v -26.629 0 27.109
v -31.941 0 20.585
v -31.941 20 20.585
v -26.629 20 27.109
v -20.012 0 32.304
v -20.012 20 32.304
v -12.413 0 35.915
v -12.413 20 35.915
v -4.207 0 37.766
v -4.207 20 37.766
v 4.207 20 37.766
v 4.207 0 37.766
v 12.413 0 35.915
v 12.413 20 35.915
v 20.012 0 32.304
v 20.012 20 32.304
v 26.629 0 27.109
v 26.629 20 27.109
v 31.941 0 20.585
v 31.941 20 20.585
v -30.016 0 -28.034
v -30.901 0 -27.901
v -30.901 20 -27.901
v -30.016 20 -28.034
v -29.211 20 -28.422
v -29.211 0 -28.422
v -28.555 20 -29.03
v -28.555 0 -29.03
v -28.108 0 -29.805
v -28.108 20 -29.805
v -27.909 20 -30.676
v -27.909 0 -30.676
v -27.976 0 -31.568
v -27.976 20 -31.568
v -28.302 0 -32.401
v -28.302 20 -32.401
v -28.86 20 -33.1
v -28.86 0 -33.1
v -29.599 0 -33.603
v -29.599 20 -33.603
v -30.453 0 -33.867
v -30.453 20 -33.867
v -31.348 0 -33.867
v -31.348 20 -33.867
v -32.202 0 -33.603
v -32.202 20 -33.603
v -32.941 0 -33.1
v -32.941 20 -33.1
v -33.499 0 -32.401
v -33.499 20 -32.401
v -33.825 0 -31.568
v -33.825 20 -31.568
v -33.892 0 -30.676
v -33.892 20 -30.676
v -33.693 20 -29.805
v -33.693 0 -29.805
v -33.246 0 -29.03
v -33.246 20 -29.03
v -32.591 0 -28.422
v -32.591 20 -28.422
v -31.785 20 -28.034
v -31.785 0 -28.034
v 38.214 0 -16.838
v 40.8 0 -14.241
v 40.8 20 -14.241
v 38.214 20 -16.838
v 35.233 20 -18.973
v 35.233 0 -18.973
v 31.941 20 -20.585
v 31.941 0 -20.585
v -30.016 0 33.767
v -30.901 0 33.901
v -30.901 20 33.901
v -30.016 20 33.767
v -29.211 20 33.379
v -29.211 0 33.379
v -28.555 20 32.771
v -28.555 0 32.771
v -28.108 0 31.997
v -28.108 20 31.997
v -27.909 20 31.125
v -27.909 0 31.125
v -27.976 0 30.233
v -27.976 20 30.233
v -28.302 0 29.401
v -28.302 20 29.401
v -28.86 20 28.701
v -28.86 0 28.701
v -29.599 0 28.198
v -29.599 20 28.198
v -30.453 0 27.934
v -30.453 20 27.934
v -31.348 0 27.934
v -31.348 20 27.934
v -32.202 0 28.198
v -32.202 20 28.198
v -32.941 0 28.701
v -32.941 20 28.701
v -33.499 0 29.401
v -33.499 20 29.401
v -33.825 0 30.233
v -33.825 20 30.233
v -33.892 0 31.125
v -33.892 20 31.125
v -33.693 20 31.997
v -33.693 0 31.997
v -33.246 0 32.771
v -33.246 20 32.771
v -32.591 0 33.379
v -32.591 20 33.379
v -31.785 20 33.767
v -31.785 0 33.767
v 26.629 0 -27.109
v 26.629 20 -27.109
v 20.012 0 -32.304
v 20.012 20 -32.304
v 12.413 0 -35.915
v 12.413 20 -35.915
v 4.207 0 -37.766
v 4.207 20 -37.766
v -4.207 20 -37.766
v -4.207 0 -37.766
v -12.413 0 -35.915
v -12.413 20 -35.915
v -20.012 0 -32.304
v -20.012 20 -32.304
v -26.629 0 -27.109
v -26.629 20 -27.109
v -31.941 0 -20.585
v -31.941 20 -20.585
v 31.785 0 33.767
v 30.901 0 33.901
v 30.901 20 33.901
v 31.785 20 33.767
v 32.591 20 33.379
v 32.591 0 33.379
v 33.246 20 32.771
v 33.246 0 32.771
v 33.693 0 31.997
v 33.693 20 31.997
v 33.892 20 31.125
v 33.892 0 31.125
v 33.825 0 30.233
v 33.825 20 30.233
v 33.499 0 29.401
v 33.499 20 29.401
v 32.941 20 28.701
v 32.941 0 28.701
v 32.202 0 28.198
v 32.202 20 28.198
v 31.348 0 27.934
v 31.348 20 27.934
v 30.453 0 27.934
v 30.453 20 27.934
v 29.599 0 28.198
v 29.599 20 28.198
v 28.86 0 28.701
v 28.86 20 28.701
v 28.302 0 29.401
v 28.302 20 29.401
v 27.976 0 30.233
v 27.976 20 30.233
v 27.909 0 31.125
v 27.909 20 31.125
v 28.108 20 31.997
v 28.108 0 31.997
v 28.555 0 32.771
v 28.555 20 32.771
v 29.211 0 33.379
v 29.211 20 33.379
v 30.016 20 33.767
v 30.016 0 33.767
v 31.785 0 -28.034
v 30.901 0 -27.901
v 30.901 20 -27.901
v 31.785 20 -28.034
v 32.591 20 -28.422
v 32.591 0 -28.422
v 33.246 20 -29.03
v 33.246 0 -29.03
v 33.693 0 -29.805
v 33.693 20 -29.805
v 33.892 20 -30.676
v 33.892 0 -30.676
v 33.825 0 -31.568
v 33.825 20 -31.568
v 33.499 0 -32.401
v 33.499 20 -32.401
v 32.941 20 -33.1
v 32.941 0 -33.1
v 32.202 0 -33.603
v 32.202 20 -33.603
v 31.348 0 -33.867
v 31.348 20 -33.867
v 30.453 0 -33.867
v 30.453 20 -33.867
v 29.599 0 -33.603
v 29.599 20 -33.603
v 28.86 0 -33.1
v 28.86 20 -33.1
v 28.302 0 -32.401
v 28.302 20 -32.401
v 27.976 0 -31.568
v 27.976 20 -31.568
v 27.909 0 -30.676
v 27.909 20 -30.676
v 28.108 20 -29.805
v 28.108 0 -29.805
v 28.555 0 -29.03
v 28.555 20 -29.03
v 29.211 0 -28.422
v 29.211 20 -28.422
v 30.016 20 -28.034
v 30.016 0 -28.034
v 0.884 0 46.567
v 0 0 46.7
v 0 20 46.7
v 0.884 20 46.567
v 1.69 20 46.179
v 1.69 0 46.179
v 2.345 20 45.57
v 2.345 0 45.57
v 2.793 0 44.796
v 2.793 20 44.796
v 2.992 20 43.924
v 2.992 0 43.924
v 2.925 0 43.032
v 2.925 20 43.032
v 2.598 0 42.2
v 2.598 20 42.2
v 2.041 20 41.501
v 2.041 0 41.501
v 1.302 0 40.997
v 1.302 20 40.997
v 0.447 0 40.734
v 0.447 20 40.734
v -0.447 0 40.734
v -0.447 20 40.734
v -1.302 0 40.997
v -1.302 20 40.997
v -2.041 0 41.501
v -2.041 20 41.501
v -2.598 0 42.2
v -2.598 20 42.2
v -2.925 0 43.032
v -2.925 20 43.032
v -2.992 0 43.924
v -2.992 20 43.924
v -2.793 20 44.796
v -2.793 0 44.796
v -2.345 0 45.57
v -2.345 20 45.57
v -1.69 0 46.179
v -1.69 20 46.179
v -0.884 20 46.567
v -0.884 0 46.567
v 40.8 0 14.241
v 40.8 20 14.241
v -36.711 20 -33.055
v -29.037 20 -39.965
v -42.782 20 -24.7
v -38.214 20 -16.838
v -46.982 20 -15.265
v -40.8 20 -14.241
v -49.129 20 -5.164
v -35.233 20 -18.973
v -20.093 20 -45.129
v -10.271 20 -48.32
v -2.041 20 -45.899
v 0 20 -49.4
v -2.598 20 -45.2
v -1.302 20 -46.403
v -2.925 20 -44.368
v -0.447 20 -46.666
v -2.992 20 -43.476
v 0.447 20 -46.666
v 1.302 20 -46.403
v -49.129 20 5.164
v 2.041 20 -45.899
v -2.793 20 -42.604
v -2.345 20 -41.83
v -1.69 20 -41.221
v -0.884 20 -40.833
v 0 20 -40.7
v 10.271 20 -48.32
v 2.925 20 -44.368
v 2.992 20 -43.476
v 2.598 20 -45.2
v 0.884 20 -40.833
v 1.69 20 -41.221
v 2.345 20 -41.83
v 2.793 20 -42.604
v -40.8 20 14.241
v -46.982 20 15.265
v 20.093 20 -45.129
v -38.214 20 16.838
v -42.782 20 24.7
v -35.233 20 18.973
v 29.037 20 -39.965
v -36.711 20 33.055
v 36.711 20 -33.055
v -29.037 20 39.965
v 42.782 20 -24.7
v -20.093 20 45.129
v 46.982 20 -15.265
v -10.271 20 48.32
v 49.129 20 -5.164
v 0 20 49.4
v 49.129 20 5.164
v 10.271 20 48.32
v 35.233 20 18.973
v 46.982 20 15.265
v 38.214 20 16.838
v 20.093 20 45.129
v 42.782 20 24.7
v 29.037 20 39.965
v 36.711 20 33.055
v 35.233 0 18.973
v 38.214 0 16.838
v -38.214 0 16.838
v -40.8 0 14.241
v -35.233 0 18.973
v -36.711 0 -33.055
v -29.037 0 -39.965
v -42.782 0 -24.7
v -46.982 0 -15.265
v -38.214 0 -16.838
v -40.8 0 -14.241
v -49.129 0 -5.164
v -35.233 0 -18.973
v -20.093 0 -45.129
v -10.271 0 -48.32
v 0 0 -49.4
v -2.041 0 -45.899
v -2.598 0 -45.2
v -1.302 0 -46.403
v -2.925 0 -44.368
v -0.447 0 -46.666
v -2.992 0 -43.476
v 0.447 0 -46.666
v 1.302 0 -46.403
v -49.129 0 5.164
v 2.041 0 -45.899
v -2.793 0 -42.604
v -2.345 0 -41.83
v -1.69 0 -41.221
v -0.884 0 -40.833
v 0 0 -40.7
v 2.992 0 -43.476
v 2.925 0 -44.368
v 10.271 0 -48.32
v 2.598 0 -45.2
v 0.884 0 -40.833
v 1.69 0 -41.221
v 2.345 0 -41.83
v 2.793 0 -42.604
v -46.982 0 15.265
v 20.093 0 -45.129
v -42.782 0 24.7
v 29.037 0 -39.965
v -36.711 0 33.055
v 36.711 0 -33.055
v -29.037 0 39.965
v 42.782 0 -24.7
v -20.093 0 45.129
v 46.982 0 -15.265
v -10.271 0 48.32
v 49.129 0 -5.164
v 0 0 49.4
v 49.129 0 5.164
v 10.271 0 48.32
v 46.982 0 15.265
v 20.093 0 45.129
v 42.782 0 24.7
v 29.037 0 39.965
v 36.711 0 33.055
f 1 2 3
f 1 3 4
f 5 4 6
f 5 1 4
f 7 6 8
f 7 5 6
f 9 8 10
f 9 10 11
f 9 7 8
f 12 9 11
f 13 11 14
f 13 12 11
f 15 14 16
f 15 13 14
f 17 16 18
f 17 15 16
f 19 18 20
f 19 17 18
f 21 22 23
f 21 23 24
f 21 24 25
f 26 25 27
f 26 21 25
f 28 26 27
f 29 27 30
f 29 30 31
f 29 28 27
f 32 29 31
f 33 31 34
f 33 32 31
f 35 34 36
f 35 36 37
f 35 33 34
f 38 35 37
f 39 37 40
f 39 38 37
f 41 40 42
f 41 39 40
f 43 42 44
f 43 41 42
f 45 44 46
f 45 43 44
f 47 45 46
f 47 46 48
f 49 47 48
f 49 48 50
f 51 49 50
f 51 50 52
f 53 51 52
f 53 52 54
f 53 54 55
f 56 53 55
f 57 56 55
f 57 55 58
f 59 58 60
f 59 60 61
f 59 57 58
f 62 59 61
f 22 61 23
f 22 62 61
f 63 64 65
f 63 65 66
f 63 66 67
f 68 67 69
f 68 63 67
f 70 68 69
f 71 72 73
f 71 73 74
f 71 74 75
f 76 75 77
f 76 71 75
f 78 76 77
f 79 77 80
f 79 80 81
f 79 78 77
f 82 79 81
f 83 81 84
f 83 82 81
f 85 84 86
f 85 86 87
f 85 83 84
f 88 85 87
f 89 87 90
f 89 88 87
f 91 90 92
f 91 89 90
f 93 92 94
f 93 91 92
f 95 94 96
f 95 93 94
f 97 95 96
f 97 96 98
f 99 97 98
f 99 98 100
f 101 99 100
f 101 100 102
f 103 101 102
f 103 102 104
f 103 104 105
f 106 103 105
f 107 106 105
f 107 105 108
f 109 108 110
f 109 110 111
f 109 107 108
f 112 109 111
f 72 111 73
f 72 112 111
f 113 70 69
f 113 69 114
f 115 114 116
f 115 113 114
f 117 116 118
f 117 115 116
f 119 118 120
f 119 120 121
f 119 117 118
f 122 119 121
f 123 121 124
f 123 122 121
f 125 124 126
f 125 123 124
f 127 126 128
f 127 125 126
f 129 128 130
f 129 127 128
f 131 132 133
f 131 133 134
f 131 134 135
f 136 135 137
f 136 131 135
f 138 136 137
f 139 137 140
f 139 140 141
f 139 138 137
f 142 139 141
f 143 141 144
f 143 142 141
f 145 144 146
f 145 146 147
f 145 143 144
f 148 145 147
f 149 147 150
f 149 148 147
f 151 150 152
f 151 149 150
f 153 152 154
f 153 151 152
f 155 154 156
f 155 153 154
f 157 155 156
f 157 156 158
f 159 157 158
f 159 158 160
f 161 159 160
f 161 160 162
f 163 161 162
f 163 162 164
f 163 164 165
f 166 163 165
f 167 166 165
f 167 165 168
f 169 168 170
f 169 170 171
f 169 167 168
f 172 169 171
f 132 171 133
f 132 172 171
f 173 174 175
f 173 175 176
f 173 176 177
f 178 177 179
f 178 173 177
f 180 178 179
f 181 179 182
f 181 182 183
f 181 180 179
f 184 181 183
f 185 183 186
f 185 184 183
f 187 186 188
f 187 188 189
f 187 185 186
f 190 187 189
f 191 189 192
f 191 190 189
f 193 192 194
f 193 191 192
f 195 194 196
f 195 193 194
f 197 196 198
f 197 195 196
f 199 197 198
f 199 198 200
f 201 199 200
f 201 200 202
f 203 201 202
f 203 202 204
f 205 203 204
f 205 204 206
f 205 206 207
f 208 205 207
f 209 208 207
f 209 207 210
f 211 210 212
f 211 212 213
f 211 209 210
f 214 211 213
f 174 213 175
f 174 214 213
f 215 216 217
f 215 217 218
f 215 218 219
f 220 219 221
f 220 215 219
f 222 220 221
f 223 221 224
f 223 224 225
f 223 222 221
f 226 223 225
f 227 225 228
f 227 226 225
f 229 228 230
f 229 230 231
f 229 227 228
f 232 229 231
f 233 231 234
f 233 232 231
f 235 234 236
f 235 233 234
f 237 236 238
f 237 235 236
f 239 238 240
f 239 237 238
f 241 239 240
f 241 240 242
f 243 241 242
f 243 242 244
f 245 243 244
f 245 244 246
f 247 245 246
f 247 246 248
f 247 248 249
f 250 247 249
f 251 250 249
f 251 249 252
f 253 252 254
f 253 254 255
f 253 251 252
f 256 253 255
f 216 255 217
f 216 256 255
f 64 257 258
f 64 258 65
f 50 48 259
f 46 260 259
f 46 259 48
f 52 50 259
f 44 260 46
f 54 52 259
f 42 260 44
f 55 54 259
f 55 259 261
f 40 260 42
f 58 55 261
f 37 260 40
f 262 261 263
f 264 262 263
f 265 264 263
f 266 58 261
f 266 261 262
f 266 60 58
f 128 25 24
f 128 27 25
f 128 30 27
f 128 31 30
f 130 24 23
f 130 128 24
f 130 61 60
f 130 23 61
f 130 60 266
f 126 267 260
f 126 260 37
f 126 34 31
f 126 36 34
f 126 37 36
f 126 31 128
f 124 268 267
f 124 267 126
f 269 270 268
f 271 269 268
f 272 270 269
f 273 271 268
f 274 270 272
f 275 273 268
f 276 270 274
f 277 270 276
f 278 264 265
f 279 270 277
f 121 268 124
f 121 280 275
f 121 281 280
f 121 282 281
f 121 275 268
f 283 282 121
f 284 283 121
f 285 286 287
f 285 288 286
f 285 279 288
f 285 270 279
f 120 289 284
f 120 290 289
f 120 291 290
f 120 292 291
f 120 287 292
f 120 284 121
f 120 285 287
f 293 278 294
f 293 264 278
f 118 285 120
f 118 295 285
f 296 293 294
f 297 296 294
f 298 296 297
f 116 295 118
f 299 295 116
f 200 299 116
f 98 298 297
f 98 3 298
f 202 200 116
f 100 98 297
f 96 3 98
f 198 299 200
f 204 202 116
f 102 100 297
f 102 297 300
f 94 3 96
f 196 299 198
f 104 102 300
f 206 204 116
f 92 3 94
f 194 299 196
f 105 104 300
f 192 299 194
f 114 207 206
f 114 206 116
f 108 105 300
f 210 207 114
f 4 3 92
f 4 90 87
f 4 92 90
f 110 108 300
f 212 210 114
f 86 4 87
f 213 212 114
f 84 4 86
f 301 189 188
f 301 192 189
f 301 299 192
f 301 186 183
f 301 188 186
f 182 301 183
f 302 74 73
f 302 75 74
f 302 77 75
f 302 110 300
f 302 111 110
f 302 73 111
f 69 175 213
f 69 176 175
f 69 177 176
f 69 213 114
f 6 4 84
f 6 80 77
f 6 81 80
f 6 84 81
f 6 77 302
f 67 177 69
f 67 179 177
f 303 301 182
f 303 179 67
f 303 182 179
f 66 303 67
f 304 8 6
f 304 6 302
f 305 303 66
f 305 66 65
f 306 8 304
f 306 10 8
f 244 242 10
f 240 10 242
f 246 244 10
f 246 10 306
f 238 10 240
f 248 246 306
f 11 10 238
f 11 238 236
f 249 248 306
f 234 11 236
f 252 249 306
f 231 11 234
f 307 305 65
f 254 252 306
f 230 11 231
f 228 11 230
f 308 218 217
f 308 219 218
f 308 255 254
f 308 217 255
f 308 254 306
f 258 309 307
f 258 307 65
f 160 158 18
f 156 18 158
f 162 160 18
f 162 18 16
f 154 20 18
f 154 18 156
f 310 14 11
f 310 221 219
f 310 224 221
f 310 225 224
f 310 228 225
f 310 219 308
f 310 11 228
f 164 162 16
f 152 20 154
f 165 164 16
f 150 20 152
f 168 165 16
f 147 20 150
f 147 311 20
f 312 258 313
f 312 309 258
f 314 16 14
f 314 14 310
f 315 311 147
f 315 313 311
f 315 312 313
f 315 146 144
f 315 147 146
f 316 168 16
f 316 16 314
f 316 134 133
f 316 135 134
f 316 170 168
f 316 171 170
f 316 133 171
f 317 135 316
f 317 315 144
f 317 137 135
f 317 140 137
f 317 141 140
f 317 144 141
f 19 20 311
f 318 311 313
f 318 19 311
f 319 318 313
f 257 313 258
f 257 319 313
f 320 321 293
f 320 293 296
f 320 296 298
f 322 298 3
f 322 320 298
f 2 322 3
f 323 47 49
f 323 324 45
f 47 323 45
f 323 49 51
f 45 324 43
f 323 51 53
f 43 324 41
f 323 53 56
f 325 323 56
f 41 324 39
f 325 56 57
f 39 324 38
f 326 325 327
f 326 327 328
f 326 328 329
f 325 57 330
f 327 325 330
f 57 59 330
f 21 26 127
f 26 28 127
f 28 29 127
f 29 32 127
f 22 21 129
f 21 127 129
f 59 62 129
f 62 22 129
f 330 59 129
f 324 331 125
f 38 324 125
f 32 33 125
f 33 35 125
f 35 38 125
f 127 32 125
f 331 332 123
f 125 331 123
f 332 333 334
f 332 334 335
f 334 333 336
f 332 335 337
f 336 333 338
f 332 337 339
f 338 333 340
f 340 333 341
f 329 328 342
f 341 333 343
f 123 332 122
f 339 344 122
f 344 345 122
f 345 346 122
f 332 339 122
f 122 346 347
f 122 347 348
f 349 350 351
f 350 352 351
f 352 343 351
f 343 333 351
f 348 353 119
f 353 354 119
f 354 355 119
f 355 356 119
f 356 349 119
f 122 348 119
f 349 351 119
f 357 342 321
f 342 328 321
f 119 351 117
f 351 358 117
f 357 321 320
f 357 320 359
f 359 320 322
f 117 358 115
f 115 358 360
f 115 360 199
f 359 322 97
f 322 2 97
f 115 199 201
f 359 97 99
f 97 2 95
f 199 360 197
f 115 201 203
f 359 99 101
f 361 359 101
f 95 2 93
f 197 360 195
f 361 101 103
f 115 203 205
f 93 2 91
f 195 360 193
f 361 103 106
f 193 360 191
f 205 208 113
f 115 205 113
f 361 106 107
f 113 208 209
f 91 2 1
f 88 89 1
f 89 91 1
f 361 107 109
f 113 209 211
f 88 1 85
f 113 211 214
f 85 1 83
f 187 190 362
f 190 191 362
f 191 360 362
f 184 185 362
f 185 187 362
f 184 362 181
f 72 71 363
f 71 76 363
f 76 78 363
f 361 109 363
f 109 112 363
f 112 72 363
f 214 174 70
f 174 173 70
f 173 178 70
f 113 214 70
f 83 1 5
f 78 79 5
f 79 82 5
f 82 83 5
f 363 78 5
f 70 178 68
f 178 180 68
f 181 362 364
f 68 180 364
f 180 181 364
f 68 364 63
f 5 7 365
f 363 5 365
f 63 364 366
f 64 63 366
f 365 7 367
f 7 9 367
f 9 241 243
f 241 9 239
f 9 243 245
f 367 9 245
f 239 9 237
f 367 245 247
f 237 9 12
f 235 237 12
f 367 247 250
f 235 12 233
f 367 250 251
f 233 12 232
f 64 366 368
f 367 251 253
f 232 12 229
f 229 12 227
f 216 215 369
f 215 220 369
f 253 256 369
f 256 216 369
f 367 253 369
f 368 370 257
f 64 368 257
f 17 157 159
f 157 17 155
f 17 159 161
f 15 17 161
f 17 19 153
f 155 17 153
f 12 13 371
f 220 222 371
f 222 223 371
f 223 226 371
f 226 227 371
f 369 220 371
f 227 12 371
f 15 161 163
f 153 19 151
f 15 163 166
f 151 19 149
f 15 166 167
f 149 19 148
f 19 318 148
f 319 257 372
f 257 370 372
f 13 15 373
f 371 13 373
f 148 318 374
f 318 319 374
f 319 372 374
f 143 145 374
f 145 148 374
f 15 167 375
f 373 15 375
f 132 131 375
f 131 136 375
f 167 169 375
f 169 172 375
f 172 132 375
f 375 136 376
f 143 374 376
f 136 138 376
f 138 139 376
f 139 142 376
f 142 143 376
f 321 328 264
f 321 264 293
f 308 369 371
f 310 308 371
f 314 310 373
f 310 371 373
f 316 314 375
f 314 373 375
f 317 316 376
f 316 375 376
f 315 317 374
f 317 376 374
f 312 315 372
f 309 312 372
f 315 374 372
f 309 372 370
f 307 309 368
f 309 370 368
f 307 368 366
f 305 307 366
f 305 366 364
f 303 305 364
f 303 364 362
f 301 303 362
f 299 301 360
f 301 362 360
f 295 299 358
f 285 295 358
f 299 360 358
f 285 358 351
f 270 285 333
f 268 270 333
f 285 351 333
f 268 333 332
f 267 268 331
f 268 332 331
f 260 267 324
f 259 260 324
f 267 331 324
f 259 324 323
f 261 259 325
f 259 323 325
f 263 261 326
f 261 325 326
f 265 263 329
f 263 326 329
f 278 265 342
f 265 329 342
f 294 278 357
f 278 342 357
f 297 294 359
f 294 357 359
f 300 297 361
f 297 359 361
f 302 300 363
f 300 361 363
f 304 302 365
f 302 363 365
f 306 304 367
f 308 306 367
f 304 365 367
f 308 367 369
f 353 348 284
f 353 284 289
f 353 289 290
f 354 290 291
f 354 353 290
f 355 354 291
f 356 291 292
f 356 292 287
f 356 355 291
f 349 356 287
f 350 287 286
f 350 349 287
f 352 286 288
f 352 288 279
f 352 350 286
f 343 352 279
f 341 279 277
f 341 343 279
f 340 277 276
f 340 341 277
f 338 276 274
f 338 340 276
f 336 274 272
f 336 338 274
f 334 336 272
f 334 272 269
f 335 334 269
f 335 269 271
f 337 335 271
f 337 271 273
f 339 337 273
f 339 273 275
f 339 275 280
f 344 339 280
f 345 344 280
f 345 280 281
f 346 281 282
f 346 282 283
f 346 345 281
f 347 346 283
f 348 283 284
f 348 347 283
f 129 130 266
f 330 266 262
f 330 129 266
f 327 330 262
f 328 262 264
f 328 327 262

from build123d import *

# Parameters (mm, degrees)
SKETCH2_R           = 49.4
BOSS_EXTRUDE1_DEPTH = 20
SKETCH2_9_R         = 3
CUT_EXTRUDE1_DEPTH  = 20


with BuildPart() as part:
    # Sketch2 → Boss-Extrude1 (new body)
    with BuildSketch(Plane(origin=(0, 0, 0), x_dir=(1, 0, 0), z_dir=(0, 1, 0))):
        Circle(SKETCH2_R)
        with BuildLine():
            Line((-40.8, 14.240786495), (-40.8, -14.240786495))
            ThreePointArc((-40.8, -14.240786495), (-36.767834145, -17.967438449), (-31.941422594, -20.585080099))
            ThreePointArc((-31.941422594, -20.585080099), (0, -38), (31.941422594, -20.585080099))
            ThreePointArc((31.941422594, -20.585080099), (36.767834145, -17.967438449), (40.8, -14.240786495))
            Line((40.8, -14.240786495), (40.8, 14.240786495))
            ThreePointArc((40.8, 14.240786495), (36.767834145, 17.967438449), (31.941422594, 20.585080099))
            ThreePointArc((31.941422594, 20.585080099), (0, 38), (-31.941422594, 20.585080099))
            ThreePointArc((-31.941422594, 20.585080099), (-36.767834145, 17.967438449), (-40.8, 14.240786495))
        make_face(mode=Mode.SUBTRACT)
    extrude(amount=BOSS_EXTRUDE1_DEPTH)

    # Sketch2<9> → Cut-Extrude1 (cut)
    with BuildSketch(Plane(origin=(0, 0, 0), x_dir=(1, 0, 0), z_dir=(0, 1, 0))):
        with Locations((0, 43.7)):
            Circle(SKETCH2_9_R)
        with Locations((30.900566338, 30.900566338)):
            Circle(SKETCH2_9_R)
        with Locations((30.900566338, -30.900566338)):
            Circle(SKETCH2_9_R)
        with Locations((0, -43.7)):
            Circle(SKETCH2_9_R)
        with Locations((-30.900566338, -30.900566338)):
            Circle(SKETCH2_9_R)
        with Locations((-30.900566338, 30.900566338)):
            Circle(SKETCH2_9_R)
    extrude(amount=CUT_EXTRUDE1_DEPTH, mode=Mode.SUBTRACT)


solid = part.part
